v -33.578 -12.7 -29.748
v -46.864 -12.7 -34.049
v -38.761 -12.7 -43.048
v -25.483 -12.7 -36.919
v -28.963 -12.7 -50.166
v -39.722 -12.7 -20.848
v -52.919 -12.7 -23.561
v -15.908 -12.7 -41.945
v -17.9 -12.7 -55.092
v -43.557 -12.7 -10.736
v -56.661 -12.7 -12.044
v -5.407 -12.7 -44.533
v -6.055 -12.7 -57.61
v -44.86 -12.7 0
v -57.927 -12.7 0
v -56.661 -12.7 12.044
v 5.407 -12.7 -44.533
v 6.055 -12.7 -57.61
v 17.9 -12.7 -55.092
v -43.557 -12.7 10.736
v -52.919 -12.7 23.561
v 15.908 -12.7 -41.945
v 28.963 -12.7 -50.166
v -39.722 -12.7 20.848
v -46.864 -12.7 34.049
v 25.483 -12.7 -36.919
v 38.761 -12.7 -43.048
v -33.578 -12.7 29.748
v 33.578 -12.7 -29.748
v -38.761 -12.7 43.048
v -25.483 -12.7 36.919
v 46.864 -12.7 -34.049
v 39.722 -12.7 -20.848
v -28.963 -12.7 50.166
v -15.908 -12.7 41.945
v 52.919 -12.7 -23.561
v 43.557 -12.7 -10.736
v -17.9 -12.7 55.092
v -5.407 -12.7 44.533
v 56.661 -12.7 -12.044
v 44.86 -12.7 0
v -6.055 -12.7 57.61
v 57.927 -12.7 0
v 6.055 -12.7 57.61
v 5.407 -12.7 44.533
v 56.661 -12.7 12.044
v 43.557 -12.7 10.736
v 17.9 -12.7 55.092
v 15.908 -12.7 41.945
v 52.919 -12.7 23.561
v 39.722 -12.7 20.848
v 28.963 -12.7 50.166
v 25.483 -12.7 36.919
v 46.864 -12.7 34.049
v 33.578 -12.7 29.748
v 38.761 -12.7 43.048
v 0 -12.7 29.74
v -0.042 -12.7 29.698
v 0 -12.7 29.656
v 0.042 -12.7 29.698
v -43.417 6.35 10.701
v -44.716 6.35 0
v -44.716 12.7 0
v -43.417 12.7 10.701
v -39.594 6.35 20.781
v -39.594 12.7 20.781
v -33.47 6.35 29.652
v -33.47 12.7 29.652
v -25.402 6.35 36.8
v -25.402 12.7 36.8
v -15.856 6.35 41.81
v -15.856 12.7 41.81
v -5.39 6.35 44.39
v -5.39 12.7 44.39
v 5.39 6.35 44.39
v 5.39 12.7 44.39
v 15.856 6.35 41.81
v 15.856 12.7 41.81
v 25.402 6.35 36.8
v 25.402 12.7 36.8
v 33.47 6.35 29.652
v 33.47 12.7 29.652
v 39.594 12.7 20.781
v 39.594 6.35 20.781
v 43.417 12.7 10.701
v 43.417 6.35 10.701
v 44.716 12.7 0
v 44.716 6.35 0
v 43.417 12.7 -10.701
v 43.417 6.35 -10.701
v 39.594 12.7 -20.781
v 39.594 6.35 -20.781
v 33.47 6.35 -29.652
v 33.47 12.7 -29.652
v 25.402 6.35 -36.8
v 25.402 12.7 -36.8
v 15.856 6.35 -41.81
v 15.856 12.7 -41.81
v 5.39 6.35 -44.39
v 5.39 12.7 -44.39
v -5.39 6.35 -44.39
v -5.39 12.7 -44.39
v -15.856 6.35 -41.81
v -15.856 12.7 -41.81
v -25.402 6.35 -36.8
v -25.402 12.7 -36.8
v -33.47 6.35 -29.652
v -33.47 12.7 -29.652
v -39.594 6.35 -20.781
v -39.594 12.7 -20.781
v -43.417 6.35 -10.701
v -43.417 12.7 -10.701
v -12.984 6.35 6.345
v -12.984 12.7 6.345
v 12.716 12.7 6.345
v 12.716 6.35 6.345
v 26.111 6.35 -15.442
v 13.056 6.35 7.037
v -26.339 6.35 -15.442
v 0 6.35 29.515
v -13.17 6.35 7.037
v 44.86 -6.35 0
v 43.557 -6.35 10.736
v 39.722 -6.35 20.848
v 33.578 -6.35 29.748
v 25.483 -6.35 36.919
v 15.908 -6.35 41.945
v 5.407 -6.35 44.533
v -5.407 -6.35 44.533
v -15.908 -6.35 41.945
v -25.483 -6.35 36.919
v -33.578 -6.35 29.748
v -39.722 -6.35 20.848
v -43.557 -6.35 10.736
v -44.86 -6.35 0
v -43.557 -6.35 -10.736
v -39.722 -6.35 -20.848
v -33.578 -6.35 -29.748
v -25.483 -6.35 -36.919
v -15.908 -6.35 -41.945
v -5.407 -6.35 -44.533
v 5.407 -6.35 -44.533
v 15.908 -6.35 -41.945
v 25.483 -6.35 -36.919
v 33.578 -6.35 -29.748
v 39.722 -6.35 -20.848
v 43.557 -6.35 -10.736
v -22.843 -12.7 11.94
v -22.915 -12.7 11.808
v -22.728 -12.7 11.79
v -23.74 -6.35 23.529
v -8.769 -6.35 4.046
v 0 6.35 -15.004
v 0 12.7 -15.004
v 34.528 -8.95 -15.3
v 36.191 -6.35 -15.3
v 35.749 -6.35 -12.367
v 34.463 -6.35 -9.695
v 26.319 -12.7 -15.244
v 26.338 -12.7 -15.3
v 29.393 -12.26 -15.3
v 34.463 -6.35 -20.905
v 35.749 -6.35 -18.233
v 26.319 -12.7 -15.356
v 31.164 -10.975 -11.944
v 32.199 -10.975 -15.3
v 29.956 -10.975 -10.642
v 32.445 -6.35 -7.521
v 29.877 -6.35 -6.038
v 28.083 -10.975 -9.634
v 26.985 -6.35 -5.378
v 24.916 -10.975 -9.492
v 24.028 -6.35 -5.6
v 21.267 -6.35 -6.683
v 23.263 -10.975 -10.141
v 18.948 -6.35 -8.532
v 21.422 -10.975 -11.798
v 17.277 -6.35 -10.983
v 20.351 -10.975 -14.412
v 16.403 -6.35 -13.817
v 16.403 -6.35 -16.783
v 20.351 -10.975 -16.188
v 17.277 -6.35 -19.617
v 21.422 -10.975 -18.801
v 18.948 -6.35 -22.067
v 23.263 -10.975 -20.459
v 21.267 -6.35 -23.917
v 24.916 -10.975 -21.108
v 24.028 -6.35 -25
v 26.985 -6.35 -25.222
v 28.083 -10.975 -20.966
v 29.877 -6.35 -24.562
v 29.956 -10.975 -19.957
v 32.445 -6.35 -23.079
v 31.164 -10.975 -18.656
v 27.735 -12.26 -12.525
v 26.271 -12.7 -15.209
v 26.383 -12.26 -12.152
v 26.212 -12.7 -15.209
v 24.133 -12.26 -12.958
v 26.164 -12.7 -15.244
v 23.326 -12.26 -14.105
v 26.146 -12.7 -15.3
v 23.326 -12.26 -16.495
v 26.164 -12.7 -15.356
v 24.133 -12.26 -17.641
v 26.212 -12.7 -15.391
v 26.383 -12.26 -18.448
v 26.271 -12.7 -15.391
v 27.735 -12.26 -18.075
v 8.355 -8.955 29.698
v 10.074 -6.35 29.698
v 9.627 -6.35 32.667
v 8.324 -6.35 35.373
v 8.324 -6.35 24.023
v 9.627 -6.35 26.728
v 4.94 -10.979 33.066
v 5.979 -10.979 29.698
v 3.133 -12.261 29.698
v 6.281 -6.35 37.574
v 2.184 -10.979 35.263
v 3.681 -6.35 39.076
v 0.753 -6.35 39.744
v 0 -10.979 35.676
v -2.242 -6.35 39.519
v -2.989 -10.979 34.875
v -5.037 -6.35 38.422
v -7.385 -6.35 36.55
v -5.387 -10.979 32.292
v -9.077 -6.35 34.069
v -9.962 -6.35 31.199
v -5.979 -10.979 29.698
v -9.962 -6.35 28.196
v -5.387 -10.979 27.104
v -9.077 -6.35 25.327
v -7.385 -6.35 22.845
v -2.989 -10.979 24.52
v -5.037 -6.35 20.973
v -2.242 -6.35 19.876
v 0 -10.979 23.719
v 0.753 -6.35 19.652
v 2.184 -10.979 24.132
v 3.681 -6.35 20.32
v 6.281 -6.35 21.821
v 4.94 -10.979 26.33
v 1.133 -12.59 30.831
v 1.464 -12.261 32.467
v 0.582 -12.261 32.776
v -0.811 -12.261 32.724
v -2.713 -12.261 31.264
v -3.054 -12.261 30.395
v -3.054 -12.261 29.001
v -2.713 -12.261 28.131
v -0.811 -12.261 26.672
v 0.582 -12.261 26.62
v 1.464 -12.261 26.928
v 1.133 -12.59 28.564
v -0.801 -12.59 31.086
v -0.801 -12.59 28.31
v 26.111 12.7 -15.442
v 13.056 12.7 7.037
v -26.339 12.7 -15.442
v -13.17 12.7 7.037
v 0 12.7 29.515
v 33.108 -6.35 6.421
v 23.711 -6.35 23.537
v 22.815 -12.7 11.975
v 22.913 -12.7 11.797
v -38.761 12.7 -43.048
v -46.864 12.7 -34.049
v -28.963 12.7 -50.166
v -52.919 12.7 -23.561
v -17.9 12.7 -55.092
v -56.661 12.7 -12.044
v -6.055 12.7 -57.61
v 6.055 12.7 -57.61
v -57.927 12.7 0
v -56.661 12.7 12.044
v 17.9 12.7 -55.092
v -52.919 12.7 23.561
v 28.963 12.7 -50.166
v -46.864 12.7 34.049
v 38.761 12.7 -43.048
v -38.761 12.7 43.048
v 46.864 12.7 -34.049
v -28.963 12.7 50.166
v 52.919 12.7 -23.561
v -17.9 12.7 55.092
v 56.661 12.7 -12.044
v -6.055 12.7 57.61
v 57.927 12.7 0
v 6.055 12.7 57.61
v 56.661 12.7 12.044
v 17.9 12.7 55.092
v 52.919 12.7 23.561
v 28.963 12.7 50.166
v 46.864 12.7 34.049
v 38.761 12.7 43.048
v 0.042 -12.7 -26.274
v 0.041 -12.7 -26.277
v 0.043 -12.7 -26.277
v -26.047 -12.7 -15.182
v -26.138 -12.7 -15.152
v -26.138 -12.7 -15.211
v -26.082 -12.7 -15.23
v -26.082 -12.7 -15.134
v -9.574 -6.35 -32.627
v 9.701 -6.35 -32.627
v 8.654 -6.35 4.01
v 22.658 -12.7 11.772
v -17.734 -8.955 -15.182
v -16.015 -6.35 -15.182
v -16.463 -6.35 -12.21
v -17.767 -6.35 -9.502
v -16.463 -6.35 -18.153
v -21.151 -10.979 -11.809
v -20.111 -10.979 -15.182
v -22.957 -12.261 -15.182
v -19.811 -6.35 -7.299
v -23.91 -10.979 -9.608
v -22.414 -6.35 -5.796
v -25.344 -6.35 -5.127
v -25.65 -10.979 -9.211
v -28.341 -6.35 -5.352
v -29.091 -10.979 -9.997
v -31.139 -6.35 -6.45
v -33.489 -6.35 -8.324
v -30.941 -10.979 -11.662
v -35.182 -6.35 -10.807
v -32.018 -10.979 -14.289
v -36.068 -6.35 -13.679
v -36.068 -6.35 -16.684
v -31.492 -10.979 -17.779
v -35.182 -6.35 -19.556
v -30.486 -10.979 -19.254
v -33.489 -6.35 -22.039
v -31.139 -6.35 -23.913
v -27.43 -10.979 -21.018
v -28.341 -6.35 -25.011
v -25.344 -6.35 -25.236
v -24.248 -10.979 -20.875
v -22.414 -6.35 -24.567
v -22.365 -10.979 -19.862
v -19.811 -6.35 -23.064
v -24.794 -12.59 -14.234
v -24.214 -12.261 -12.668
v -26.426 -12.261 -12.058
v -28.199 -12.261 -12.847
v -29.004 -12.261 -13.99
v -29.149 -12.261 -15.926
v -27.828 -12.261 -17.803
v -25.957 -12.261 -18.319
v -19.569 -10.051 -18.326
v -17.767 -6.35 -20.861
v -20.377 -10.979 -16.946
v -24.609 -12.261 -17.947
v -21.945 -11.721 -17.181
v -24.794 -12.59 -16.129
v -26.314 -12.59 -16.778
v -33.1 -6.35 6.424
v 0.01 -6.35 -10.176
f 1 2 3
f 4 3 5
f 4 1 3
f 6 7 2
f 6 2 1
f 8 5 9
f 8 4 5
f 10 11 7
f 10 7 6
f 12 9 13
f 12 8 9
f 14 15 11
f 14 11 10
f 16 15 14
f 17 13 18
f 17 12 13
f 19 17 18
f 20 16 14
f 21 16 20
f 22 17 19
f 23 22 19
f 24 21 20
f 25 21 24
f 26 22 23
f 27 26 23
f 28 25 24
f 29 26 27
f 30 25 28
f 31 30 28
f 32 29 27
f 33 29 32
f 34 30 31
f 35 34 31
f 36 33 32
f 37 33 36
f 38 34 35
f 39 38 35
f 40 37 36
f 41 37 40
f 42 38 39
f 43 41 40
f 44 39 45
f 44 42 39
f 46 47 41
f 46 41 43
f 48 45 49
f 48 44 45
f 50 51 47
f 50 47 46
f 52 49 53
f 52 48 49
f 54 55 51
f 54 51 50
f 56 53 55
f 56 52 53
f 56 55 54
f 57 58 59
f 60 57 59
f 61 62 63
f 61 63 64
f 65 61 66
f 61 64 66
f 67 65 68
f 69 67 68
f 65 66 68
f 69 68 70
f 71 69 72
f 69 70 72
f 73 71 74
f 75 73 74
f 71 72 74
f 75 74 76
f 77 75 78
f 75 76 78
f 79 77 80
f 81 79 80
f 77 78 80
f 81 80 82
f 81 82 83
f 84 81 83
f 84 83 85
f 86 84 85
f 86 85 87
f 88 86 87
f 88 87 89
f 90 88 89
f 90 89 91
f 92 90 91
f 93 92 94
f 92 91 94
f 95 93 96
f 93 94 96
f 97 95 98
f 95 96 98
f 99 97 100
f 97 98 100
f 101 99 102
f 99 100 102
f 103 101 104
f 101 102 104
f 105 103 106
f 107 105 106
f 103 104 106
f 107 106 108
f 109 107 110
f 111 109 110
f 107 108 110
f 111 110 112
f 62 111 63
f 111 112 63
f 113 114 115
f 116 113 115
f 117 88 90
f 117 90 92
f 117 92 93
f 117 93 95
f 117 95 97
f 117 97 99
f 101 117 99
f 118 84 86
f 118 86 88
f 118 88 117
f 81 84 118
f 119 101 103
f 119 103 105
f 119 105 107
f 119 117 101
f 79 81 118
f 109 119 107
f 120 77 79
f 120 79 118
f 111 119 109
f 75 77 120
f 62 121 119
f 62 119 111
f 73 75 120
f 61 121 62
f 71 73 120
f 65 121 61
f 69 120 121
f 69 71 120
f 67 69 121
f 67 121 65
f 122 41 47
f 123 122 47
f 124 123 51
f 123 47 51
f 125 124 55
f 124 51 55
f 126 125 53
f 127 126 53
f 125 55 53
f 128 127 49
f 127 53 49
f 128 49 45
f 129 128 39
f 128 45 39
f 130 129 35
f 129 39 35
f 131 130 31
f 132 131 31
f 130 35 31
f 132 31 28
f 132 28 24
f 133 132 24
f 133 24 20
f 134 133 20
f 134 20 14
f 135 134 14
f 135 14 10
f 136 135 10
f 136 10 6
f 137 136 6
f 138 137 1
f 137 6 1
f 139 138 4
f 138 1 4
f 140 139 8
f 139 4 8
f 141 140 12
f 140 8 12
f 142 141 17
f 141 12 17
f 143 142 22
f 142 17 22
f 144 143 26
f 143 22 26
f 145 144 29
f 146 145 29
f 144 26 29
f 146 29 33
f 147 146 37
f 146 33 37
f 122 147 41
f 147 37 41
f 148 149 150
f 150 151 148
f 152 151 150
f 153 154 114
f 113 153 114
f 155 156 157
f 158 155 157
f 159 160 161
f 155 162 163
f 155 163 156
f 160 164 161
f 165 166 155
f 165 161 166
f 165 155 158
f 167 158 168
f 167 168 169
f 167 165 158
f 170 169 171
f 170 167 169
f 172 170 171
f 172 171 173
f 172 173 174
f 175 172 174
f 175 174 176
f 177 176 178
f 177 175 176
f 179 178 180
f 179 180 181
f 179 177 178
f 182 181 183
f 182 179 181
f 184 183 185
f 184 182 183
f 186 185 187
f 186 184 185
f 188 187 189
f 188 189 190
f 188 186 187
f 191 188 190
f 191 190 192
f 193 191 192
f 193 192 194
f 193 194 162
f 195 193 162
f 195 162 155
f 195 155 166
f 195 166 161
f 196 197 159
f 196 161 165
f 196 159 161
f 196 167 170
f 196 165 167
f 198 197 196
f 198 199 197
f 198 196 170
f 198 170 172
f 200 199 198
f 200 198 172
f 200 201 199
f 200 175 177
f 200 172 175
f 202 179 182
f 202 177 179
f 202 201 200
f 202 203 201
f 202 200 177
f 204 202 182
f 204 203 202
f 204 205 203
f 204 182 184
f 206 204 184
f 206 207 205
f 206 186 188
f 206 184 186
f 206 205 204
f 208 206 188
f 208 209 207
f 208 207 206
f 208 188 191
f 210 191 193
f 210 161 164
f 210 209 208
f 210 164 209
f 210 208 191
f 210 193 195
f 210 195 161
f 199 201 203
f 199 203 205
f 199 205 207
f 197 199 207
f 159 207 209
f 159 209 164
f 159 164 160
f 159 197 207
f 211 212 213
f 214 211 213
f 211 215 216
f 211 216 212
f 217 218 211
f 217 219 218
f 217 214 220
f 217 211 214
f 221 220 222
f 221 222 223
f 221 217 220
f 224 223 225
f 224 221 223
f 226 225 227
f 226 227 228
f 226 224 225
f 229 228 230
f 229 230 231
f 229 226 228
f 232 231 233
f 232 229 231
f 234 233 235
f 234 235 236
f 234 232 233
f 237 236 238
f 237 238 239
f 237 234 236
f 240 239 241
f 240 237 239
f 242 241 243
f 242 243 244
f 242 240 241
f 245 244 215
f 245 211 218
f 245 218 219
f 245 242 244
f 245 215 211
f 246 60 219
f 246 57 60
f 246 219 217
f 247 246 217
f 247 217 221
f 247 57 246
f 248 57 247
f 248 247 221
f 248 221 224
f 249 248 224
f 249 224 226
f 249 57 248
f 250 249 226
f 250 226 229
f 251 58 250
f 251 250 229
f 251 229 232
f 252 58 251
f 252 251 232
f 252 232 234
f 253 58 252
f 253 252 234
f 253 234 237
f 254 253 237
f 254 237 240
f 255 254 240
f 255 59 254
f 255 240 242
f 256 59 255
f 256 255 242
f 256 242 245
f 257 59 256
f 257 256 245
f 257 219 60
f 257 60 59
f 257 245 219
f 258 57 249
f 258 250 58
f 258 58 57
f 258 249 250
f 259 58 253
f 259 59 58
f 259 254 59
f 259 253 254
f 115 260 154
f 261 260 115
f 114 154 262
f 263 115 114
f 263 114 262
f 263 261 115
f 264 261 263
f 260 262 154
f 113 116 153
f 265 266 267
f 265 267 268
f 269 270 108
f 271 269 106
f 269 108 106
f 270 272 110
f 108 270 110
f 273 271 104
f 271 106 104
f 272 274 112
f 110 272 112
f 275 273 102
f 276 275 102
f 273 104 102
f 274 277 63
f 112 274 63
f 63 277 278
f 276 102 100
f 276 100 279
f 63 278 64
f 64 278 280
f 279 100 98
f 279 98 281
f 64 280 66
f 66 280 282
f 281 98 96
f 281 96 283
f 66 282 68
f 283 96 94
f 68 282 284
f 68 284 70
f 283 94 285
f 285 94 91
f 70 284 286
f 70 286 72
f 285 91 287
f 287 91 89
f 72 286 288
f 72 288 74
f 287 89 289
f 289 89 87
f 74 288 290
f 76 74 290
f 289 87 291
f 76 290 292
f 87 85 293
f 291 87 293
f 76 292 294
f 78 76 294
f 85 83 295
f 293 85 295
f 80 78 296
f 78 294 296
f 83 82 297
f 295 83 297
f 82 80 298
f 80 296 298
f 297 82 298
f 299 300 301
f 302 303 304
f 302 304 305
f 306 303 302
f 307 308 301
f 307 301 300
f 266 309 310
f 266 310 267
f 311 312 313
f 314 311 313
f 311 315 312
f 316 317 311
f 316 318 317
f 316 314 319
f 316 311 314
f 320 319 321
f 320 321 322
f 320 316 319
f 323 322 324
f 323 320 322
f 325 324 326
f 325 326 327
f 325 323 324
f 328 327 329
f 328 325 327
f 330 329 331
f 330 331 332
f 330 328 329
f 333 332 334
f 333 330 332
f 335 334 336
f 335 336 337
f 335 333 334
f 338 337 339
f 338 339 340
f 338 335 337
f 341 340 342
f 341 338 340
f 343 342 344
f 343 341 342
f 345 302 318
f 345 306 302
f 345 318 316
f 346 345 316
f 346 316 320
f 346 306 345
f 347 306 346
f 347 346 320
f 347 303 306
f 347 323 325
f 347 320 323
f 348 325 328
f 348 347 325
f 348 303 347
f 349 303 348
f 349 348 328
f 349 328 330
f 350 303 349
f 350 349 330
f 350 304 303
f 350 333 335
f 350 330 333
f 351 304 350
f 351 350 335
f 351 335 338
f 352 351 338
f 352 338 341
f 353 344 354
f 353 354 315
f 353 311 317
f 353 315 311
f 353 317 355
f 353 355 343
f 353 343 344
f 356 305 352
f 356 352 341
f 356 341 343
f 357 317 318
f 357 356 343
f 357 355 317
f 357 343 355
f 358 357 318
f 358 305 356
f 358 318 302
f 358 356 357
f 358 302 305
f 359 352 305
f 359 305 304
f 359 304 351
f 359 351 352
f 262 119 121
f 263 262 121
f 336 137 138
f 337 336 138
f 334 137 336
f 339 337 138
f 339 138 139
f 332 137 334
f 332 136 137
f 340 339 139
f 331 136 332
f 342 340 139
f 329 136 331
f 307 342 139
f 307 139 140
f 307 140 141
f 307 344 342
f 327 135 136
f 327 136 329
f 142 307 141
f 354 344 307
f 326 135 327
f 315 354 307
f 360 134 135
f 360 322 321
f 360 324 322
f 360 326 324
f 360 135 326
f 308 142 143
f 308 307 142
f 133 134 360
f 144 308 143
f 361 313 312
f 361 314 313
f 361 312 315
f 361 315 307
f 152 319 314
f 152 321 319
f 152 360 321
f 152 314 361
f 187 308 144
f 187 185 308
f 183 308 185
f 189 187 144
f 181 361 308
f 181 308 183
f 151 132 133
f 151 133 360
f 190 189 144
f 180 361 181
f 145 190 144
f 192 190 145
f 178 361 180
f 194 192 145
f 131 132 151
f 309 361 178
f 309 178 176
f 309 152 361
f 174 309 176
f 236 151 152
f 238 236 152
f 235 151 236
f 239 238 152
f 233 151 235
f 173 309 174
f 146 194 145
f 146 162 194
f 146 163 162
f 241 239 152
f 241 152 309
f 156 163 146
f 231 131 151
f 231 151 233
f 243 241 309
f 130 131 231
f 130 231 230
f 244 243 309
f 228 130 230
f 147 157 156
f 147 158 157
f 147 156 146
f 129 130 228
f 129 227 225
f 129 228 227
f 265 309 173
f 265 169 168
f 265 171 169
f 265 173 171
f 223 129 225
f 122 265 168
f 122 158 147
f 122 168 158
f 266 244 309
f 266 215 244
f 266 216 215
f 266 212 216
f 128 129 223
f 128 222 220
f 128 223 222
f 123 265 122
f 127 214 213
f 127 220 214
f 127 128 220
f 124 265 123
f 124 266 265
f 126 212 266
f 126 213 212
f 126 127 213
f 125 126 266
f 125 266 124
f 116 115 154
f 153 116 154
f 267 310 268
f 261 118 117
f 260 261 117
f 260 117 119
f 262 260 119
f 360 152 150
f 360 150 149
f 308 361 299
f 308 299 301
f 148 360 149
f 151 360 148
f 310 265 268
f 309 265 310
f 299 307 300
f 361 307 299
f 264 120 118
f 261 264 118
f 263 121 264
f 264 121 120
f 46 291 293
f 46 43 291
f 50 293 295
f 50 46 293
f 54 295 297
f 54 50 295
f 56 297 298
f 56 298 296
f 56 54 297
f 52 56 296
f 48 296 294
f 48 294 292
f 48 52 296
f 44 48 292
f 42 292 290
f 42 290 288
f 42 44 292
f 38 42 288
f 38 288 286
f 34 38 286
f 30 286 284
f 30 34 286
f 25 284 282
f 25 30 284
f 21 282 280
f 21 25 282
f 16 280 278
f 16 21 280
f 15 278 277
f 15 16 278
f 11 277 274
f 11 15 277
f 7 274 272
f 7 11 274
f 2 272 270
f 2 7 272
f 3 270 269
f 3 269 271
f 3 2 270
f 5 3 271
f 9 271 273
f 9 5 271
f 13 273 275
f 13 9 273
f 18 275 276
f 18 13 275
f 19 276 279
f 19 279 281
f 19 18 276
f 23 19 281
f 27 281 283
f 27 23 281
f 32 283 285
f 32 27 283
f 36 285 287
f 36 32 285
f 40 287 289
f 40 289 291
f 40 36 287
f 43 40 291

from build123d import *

# Parameters (mm, degrees)
F0_R          = 57.9269385224
F0_R_2        = 45.238930614
F0_R_3        = 10.232456426
F0_R_4        = 9.9260337363
F0_R_5        = 10.3400506536
F1_DEPTH      = 12.7
F2_DEPTH      = 12.7
F3_R          = 44.8601198224
F4_DEPTH      = 6.35
F5_R          = 44.7159015694
F6_DEPTH      = 6.35
F7_R          = 10.0743297083
F7_R_2        = 9.9496681994
F7_R_3        = 10.0826621072
F8_DEPTH      = 6.35
F13_DEPTH     = 6.35
F14_T4_DEPTH  = 74.4109063998
F14_T11_DEPTH = 74.5717160691
F14_T18_DEPTH = 67.9697661213
F14_T26_DEPTH = 74.4109063998
F14_T31_DEPTH = 67.9697661213
F14_T39_DEPTH = 74.4109063998
F14_T44_DEPTH = 74.5717160691
F14_T52_DEPTH = 74.5717160691
F14_T57_DEPTH = 67.9697661213
F15_T4_DEPTH  = 74.5533850225
F15_T11_DEPTH = 67.988668277
F15_T18_DEPTH = 74.6646190403
F15_T26_DEPTH = 74.5533850225
F15_T31_DEPTH = 74.6646190403
F15_T39_DEPTH = 74.5533850225
F15_T44_DEPTH = 67.988668277
F15_T52_DEPTH = 74.6646190403
F15_T57_DEPTH = 67.988668277
F16_T4_DEPTH  = 74.2472188603
F16_T10_DEPTH = 74.1921905859
F16_T16_DEPTH = 67.5143742402
F18_DEPTH     = 6.35
F20_DEPTH     = 6.35


# Not quite as in the source:
# - a fillet or chamfer that OpenCascade refuses, or shapes differently, is made with other operations: its cross-section is extruded or revolved along the edge and cut away or added


with BuildPart() as f1:
    # F0 (on Front) → F1 (new body)
    with BuildSketch(Plane.XZ):
        Circle(F0_R)
        Circle(F0_R_2, mode=Mode.SUBTRACT)
        Circle(F0_R_2)
        with Locations((-26.1295642704, -15.3669575229)):
            Circle(F0_R_3, mode=Mode.SUBTRACT)
        Polygon((-12.544834055, -34.5090515912), (0, -5.3877583705), (12.6424450427, -34.5090515912), align=None, mode=Mode.SUBTRACT)
        with Locations((26.1333119124, -15.1850637048)):
            Circle(F0_R_4, mode=Mode.SUBTRACT)
        Polygon((-36.0336452723, 4.8764180392), (-24.01153557, 26.9035063684), (-4.5260344632, 1.7700339667), align=None, mode=Mode.SUBTRACT)
        Polygon((36.1581519246, 4.842239432), (4.4649434276, 1.758374623), (24.0084677935, 26.875147596), align=None, mode=Mode.SUBTRACT)
        with Locations((0, 29.5979101211)):
            Circle(F0_R_5, mode=Mode.SUBTRACT)
        with Locations((0, 29.5979101211)):
            Circle(F0_R_5)
        Polygon((-4.5260344632, 1.7700339667), (-24.01153557, 26.9035063684), (-36.0336452723, 4.8764180392), align=None)
        with Locations((-26.1295642704, -15.3669575229)):
            Circle(F0_R_3)
        Polygon((12.6424450427, -34.5090515912), (0, -5.3877583705), (-12.544834055, -34.5090515912), align=None)
        with Locations((26.1333119124, -15.1850637048)):
            Circle(F0_R_4)
        Polygon((24.0084677935, 26.875147596), (4.4649434276, 1.758374623), (36.1581519246, 4.842239432), align=None)
    extrude(amount=F1_DEPTH)

    # F2 (add): a face of the model
    f2_faces = [f1.faces().sort_by_distance(p)[0] for p in [
        (0, 0, 0),
    ]]
    extrude(f2_faces, amount=F2_DEPTH)

    # F3 (on face) → F4 (cut)
    with BuildSketch(Plane.XZ.offset(12.7)):
        Circle(F3_R)
    extrude(amount=-F4_DEPTH, mode=Mode.SUBTRACT)

    # F5 (on face) → F6 (cut)
    with BuildSketch(Plane(origin=(0, 12.7, 0), x_dir=(-1, 0, 0), z_dir=(0, 1, 0))):
        Circle(F5_R)
    extrude(amount=-F6_DEPTH, mode=Mode.SUBTRACT)

    # F7 (on face) → F8 (join)
    with BuildSketch(Plane.XZ.offset(6.35)):
        with Locations((0, 29.6977050602)):
            Circle(F7_R)
        with Locations((26.2417513877, -15.2999386191)):
            Circle(F7_R_2)
        with Locations((-26.0976161808, -15.1815246791)):
            Circle(F7_R_3)
    extrude(amount=F8_DEPTH)

    # F9: fillet of radius 11.0998 on 1 edges, made by hand

    # F9_s1 → F9_t2 (revolve, cut)
    with BuildSketch(Plane.XY.offset(29.6977050602)):
        with BuildLine():
            ThreePointArc((10.0743297083, -6.35), (5.9786194513, -10.9790962592), (0.0421335379, -12.7))
            Line((0.0421335379, -12.7), (10.0743297083, -12.7))
            Line((10.0743297083, -12.7), (10.0743297083, -6.35))
        make_face()
    revolve(axis=Axis((0, -12.7, 29.6977050602), (0, -1, 0)), mode=Mode.SUBTRACT)

    # F10: fillet of radius 11.0998 on 1 edges, made by hand

    # F10_s1 → F10_t2 (revolve, cut)
    with BuildSketch(Plane.XY.offset(-15.1815246791)):
        with BuildLine():
            ThreePointArc((-16.0149540736, -6.35), (-20.1106643305, -10.9790962592), (-26.0471502439, -12.7))
            Line((-26.0471502439, -12.7), (-16.0149540736, -12.7))
            Line((-16.0149540736, -12.7), (-16.0149540736, -6.35))
        make_face()
    revolve(axis=Axis((-26.0976161808, -12.7, -15.1815246791), (0, -1, 0)), mode=Mode.SUBTRACT)

    # F11: fillet of radius 10.8204 on 1 edges, made by hand

    # F11_s1 → F11_t2 (revolve, cut)
    with BuildSketch(Plane.XY.offset(-15.2999386191)):
        with BuildLine():
            ThreePointArc((36.1914195871, -6.35), (32.1989541242, -10.9749991754), (26.3376598985, -12.7))
            Line((26.3376598985, -12.7), (36.1914195871, -12.7))
            Line((36.1914195871, -12.7), (36.1914195871, -6.35))
        make_face()
    revolve(axis=Axis((26.2417513877, -12.7, -15.2999386191), (0, -1, 0)), mode=Mode.SUBTRACT)

    # F12 (on face) → F13 (join)
    with BuildSketch(Plane.XZ.offset(6.35)):
        Polygon((-4.5254253782, 1.6911323182), (-24.0121241659, 27.0516239107), (-36.1962728202, 4.7867787071), align=None)
        Polygon((36.2073592842, 4.7867787071), (23.9838846028, 27.0516239107), (4.3973103166, 1.6507724067), align=None)
        Polygon((12.5976987183, -34.5319546759), (0, -5.3459731862), (-12.4581893906, -34.5319546759), align=None)
    extrude(amount=F13_DEPTH)

    # F14: chamfer of 8.2804 on 3 edges, made by hand


with BuildPart() as f14_tool2:
    # F14_s3 → F14_t4 (new body)
    with BuildSketch(Plane(origin=(-57.5107438509, 0, 5.6213502606), x_dir=(0, 1, 0), z_dir=(0.9952569801, 0, -0.0972807463))):
        with BuildLine():
            Line((-4.1853949204, 1.008669406), (-12.9342050796, 9.7574795653))
            Line((-12.9342050796, 9.7574795653), (-13.0998130796, 9.7574795653))
            ThreePointArc((-13.0998130796, 9.7574795653), (-12.865608, 5.5001770255), (-12.865608, 1.2428744857))
            Line((-12.865608, 1.2428744857), (-12.7, 1.0772664857))
            ThreePointArc((-12.7, 1.0772664857), (-8.4426974602, 1.0772664857), (-4.1853949204, 0.843061406))
            Line((-4.1853949204, 0.843061406), (-4.1853949204, 1.008669406))
        make_face()
    extrude(amount=F14_T4_DEPTH)

    split(bisect_by=Plane.XZ.offset(6.35), keep=Keep.TOP)

    split(bisect_by=Plane(origin=(-29.8705033929, 0, 16.3462467576), x_dir=(0, 1, 0), z_dir=(0.8772373953, 0, -0.4800568219)), keep=Keep.TOP)

    split(bisect_by=Plane(origin=(-2.0283818724, 0, -1.5585844001), x_dir=(0, 1, 0), z_dir=(-0.7929468135, 0, -0.6092908591)), keep=Keep.TOP)


with BuildPart() as f1_1:
    add(f1.part)

    # F14_t1: cut F14_tool2
    add(f14_tool2.part, mode=Mode.SUBTRACT)


with BuildPart() as f14_tool9:
    # F14_s10 → F14_t11 (new body)
    with BuildSketch(Plane(origin=(10.477539574, 0, -13.6357398024), x_dir=(0, 1, 0), z_dir=(-0.6092908591, 0, 0.7929468135))):
        with BuildLine():
            Line((-4.1853949204, 2.3238250907), (-12.9342050796, 11.07263525))
            Line((-12.9342050796, 11.07263525), (-13.0998130796, 11.07263525))
            ThreePointArc((-13.0998130796, 11.07263525), (-12.865608, 6.8153327102), (-12.865608, 2.5580301704))
            Line((-12.865608, 2.5580301704), (-12.7, 2.3924221704))
            ThreePointArc((-12.7, 2.3924221704), (-8.4426974602, 2.3924221704), (-4.1853949204, 2.1582170907))
            Line((-4.1853949204, 2.1582170907), (-4.1853949204, 2.3238250907))
        make_face()
    extrude(amount=F14_T11_DEPTH)

    split(bisect_by=Plane.XZ.offset(6.35), keep=Keep.TOP)

    split(bisect_by=Plane(origin=(0.1209077576, 0, 1.2369795072), x_dir=(0, 1, 0), z_dir=(0.0972807463, 0, 0.9952569801)), keep=Keep.TOP)

    split(bisect_by=Plane(origin=(-29.8705033929, 0, 16.3462467576), x_dir=(0, 1, 0), z_dir=(0.8772373953, 0, -0.4800568219)), keep=Keep.TOP)


with BuildPart() as f1_2:
    add(f1_1.part)

    # F14_t8: cut F14_tool9
    add(f14_tool9.part, mode=Mode.SUBTRACT)


with BuildPart() as f14_tool16:
    # F14_s17 → F14_t18 (new body)
    with BuildSketch(Plane(origin=(16.080979856, 0, 29.3857648468), x_dir=(0, 1, 0), z_dir=(-0.4800568219, 0, -0.8772373953))):
        with BuildLine():
            Line((-4.1853949204, -34.2848549414), (-12.9342050796, -25.5360447821))
            Line((-12.9342050796, -25.5360447821), (-13.0998130796, -25.5360447821))
            ThreePointArc((-13.0998130796, -25.5360447821), (-12.865608, -29.7933473219), (-12.865608, -34.0506498617))
            Line((-12.865608, -34.0506498617), (-12.7, -34.2162578617))
            ThreePointArc((-12.7, -34.2162578617), (-8.4426974602, -34.2162578617), (-4.1853949204, -34.4504629414))
            Line((-4.1853949204, -34.4504629414), (-4.1853949204, -34.2848549414))
        make_face()
    extrude(amount=F14_T18_DEPTH)

    split(bisect_by=Plane.XZ.offset(6.35), keep=Keep.TOP)

    split(bisect_by=Plane(origin=(0.1209077576, 0, 1.2369795072), x_dir=(0, 1, 0), z_dir=(0.0972807463, 0, 0.9952569801)), keep=Keep.TOP)

    split(bisect_by=Plane(origin=(-2.0283818724, 0, -1.5585844001), x_dir=(0, 1, 0), z_dir=(-0.7929468135, 0, -0.6092908591)), keep=Keep.TOP)


with BuildPart() as f1_3:
    add(f1_2.part)

    # F14_t15: cut F14_tool16
    add(f14_tool16.part, mode=Mode.SUBTRACT)


with BuildPart() as f14_tool24:
    # F14_s25 → F14_t26 (new body)
    with BuildSketch(Plane(origin=(-57.5107438509, 0, 5.6213502606), x_dir=(0, 1, 0), z_dir=(0.9952569801, 0, -0.0972807463))):
        with BuildLine():
            Line((-4.1853949204, 1.008669406), (-12.9342050796, 9.7574795653))
            Line((-12.9342050796, 9.7574795653), (-13.0998130796, 9.7574795653))
            ThreePointArc((-13.0998130796, 9.7574795653), (-12.865608, 5.5001770255), (-12.865608, 1.2428744857))
            Line((-12.865608, 1.2428744857), (-12.7, 1.0772664857))
            ThreePointArc((-12.7, 1.0772664857), (-8.4426974602, 1.0772664857), (-4.1853949204, 0.843061406))
            Line((-4.1853949204, 0.843061406), (-4.1853949204, 1.008669406))
        make_face()
    extrude(amount=F14_T26_DEPTH)

    split(bisect_by=Plane.XZ.offset(6.35), keep=Keep.TOP)

    split(bisect_by=Plane(origin=(-29.8705033929, 0, 16.3462467576), x_dir=(0, 1, 0), z_dir=(-0.8772373953, 0, 0.4800568219)), keep=Keep.TOP)


with BuildPart() as f14_tool29:
    # F14_s30 → F14_t31 (new body)
    with BuildSketch(Plane(origin=(16.080979856, 0, 29.3857648468), x_dir=(0, 1, 0), z_dir=(-0.4800568219, 0, -0.8772373953))):
        with BuildLine():
            Line((-4.1853949204, -34.2848549414), (-12.9342050796, -25.5360447821))
            Line((-12.9342050796, -25.5360447821), (-13.0998130796, -25.5360447821))
            ThreePointArc((-13.0998130796, -25.5360447821), (-12.865608, -29.7933473219), (-12.865608, -34.0506498617))
            Line((-12.865608, -34.0506498617), (-12.7, -34.2162578617))
            ThreePointArc((-12.7, -34.2162578617), (-8.4426974602, -34.2162578617), (-4.1853949204, -34.4504629414))
            Line((-4.1853949204, -34.4504629414), (-4.1853949204, -34.2848549414))
        make_face()
    extrude(amount=F14_T31_DEPTH)

    split(bisect_by=Plane.XZ.offset(6.35), keep=Keep.TOP)

    split(bisect_by=Plane(origin=(0.1209077576, 0, 1.2369795072), x_dir=(0, 1, 0), z_dir=(-0.0972807463, 0, -0.9952569801)), keep=Keep.TOP)


with BuildPart() as f14_tool24_1:
    add(f14_tool24.part)

    # F14_t34: intersect F14_tool29
    add(f14_tool29.part, mode=Mode.INTERSECT)


with BuildPart() as f1_4:
    add(f1_3.part)

    # F14_t22: cut F14_tool24
    add(f14_tool24_1.part, mode=Mode.SUBTRACT)


with BuildPart() as f14_tool37:
    # F14_s38 → F14_t39 (new body)
    with BuildSketch(Plane(origin=(-57.5107438509, 0, 5.6213502606), x_dir=(0, 1, 0), z_dir=(0.9952569801, 0, -0.0972807463))):
        with BuildLine():
            Line((-4.1853949204, 1.008669406), (-12.9342050796, 9.7574795653))
            Line((-12.9342050796, 9.7574795653), (-13.0998130796, 9.7574795653))
            ThreePointArc((-13.0998130796, 9.7574795653), (-12.865608, 5.5001770255), (-12.865608, 1.2428744857))
            Line((-12.865608, 1.2428744857), (-12.7, 1.0772664857))
            ThreePointArc((-12.7, 1.0772664857), (-8.4426974602, 1.0772664857), (-4.1853949204, 0.843061406))
            Line((-4.1853949204, 0.843061406), (-4.1853949204, 1.008669406))
        make_face()
    extrude(amount=F14_T39_DEPTH)

    split(bisect_by=Plane.XZ.offset(6.35), keep=Keep.TOP)

    split(bisect_by=Plane(origin=(-2.0283818724, 0, -1.5585844001), x_dir=(0, 1, 0), z_dir=(0.7929468135, 0, 0.6092908591)), keep=Keep.TOP)


with BuildPart() as f14_tool42:
    # F14_s43 → F14_t44 (new body)
    with BuildSketch(Plane(origin=(10.477539574, 0, -13.6357398024), x_dir=(0, 1, 0), z_dir=(-0.6092908591, 0, 0.7929468135))):
        with BuildLine():
            Line((-4.1853949204, 2.3238250907), (-12.9342050796, 11.07263525))
            Line((-12.9342050796, 11.07263525), (-13.0998130796, 11.07263525))
            ThreePointArc((-13.0998130796, 11.07263525), (-12.865608, 6.8153327102), (-12.865608, 2.5580301704))
            Line((-12.865608, 2.5580301704), (-12.7, 2.3924221704))
            ThreePointArc((-12.7, 2.3924221704), (-8.4426974602, 2.3924221704), (-4.1853949204, 2.1582170907))
            Line((-4.1853949204, 2.1582170907), (-4.1853949204, 2.3238250907))
        make_face()
    extrude(amount=F14_T44_DEPTH)

    split(bisect_by=Plane.XZ.offset(6.35), keep=Keep.TOP)

    split(bisect_by=Plane(origin=(0.1209077576, 0, 1.2369795072), x_dir=(0, 1, 0), z_dir=(-0.0972807463, 0, -0.9952569801)), keep=Keep.TOP)


with BuildPart() as f14_tool37_1:
    add(f14_tool37.part)

    # F14_t47: intersect F14_tool42
    add(f14_tool42.part, mode=Mode.INTERSECT)


with BuildPart() as f1_5:
    add(f1_4.part)

    # F14_t35: cut F14_tool37
    add(f14_tool37_1.part, mode=Mode.SUBTRACT)


with BuildPart() as f14_tool50:
    # F14_s51 → F14_t52 (new body)
    with BuildSketch(Plane(origin=(10.477539574, 0, -13.6357398024), x_dir=(0, 1, 0), z_dir=(-0.6092908591, 0, 0.7929468135))):
        with BuildLine():
            Line((-4.1853949204, 2.3238250907), (-12.9342050796, 11.07263525))
            Line((-12.9342050796, 11.07263525), (-13.0998130796, 11.07263525))
            ThreePointArc((-13.0998130796, 11.07263525), (-12.865608, 6.8153327102), (-12.865608, 2.5580301704))
            Line((-12.865608, 2.5580301704), (-12.7, 2.3924221704))
            ThreePointArc((-12.7, 2.3924221704), (-8.4426974602, 2.3924221704), (-4.1853949204, 2.1582170907))
            Line((-4.1853949204, 2.1582170907), (-4.1853949204, 2.3238250907))
        make_face()
    extrude(amount=F14_T52_DEPTH)

    split(bisect_by=Plane.XZ.offset(6.35), keep=Keep.TOP)

    split(bisect_by=Plane(origin=(-29.8705033929, 0, 16.3462467576), x_dir=(0, 1, 0), z_dir=(-0.8772373953, 0, 0.4800568219)), keep=Keep.TOP)


with BuildPart() as f14_tool55:
    # F14_s56 → F14_t57 (new body)
    with BuildSketch(Plane(origin=(16.080979856, 0, 29.3857648468), x_dir=(0, 1, 0), z_dir=(-0.4800568219, 0, -0.8772373953))):
        with BuildLine():
            Line((-4.1853949204, -34.2848549414), (-12.9342050796, -25.5360447821))
            Line((-12.9342050796, -25.5360447821), (-13.0998130796, -25.5360447821))
            ThreePointArc((-13.0998130796, -25.5360447821), (-12.865608, -29.7933473219), (-12.865608, -34.0506498617))
            Line((-12.865608, -34.0506498617), (-12.7, -34.2162578617))
            ThreePointArc((-12.7, -34.2162578617), (-8.4426974602, -34.2162578617), (-4.1853949204, -34.4504629414))
            Line((-4.1853949204, -34.4504629414), (-4.1853949204, -34.2848549414))
        make_face()
    extrude(amount=F14_T57_DEPTH)

    split(bisect_by=Plane.XZ.offset(6.35), keep=Keep.TOP)

    split(bisect_by=Plane(origin=(-2.0283818724, 0, -1.5585844001), x_dir=(0, 1, 0), z_dir=(0.7929468135, 0, 0.6092908591)), keep=Keep.TOP)


with BuildPart() as f14_tool50_1:
    add(f14_tool50.part)

    # F14_t60: intersect F14_tool55
    add(f14_tool55.part, mode=Mode.INTERSECT)


with BuildPart() as f1_6:
    add(f1_5.part)

    # F14_t48: cut F14_tool50
    add(f14_tool50_1.part, mode=Mode.SUBTRACT)

    # F15: chamfer of 8.2804 on 3 edges, made by hand


with BuildPart() as f15_tool2:
    # F15_s3 → F15_t4 (new body)
    with BuildSketch(Plane(origin=(-16.6756708248, 0, -1.6439776255), x_dir=(0, 1, 0), z_dir=(0.995175598, 0, 0.0981097812))):
        with BuildLine():
            Line((-4.1853949204, 0.9771841842), (-12.9342050796, 9.7259943435))
            Line((-12.9342050796, 9.7259943435), (-13.0998130796, 9.7259943435))
            ThreePointArc((-13.0998130796, 9.7259943435), (-12.865608, 5.4686918036), (-12.865608, 1.2113892638))
            Line((-12.865608, 1.2113892638), (-12.7, 1.0457812638))
            ThreePointArc((-12.7, 1.0457812638), (-8.4426974602, 1.0457812638), (-4.1853949204, 0.8115761842))
            Line((-4.1853949204, 0.8115761842), (-4.1853949204, 0.9771841842))
        make_face()
    extrude(amount=F15_T4_DEPTH)

    split(bisect_by=Plane.XZ.offset(6.35), keep=Keep.TOP)

    split(bisect_by=Plane(origin=(1.9593711293, 0, -1.510869357), x_dir=(0, 1, 0), z_dir=(0.7919084131, 0, -0.6106398818)), keep=Keep.TOP)

    split(bisect_by=Plane(origin=(29.8410766305, 0, 16.3828511415), x_dir=(0, 1, 0), z_dir=(-0.8765845615, 0, -0.4812478639)), keep=Keep.TOP)


with BuildPart() as f1_7:
    add(f1_6.part)

    # F15_t1: cut F15_tool2
    add(f15_tool2.part, mode=Mode.SUBTRACT)


with BuildPart() as f15_tool9:
    # F15_s10 → F15_t11 (new body)
    with BuildSketch(Plane(origin=(16.6142460012, 0, -30.2625583178), x_dir=(0, 1, 0), z_dir=(-0.4812478639, 0, 0.8765845615))):
        with BuildLine():
            Line((-4.1853949204, -34.2766442695), (-12.9342050796, -25.5278341102))
            Line((-12.9342050796, -25.5278341102), (-13.0998130796, -25.5278341102))
            ThreePointArc((-13.0998130796, -25.5278341102), (-12.865608, -29.78513665), (-12.865608, -34.0424391898))
            Line((-12.865608, -34.0424391898), (-12.7, -34.2080471898))
            ThreePointArc((-12.7, -34.2080471898), (-8.4426974602, -34.2080471898), (-4.1853949204, -34.4422522695))
            Line((-4.1853949204, -34.4422522695), (-4.1853949204, -34.2766442695))
        make_face()
    extrude(amount=F15_T11_DEPTH)

    split(bisect_by=Plane.XZ.offset(6.35), keep=Keep.TOP)

    split(bisect_by=Plane(origin=(-0.1188491357, 0, 1.205545035), x_dir=(0, 1, 0), z_dir=(-0.0981097812, 0, 0.995175598)), keep=Keep.TOP)

    split(bisect_by=Plane(origin=(1.9593711293, 0, -1.510869357), x_dir=(0, 1, 0), z_dir=(0.7919084131, 0, -0.6106398818)), keep=Keep.TOP)


with BuildPart() as f1_8:
    add(f1_7.part)

    # F15_t8: cut F15_tool9
    add(f15_tool9.part, mode=Mode.SUBTRACT)


with BuildPart() as f15_tool16:
    # F15_s17 → F15_t18 (new body)
    with BuildSketch(Plane(origin=(35.0278234042, 0, 45.4258375046), x_dir=(0, 1, 0), z_dir=(-0.6106398818, 0, -0.7919084131))):
        with BuildLine():
            Line((-4.1853949204, 2.2400344876), (-12.9342050796, 10.9888446469))
            Line((-12.9342050796, 10.9888446469), (-13.0998130796, 10.9888446469))
            ThreePointArc((-13.0998130796, 10.9888446469), (-12.865608, 6.7315421071), (-12.865608, 2.4742395673))
            Line((-12.865608, 2.4742395673), (-12.7, 2.3086315673))
            ThreePointArc((-12.7, 2.3086315673), (-8.4426974602, 2.3086315673), (-4.1853949204, 2.0744264876))
            Line((-4.1853949204, 2.0744264876), (-4.1853949204, 2.2400344876))
        make_face()
    extrude(amount=F15_T18_DEPTH)

    split(bisect_by=Plane.XZ.offset(6.35), keep=Keep.TOP)

    split(bisect_by=Plane(origin=(-0.1188491357, 0, 1.205545035), x_dir=(0, 1, 0), z_dir=(-0.0981097812, 0, 0.995175598)), keep=Keep.TOP)

    split(bisect_by=Plane(origin=(29.8410766305, 0, 16.3828511415), x_dir=(0, 1, 0), z_dir=(-0.8765845615, 0, -0.4812478639)), keep=Keep.TOP)


with BuildPart() as f1_9:
    add(f1_8.part)

    # F15_t15: cut F15_tool16
    add(f15_tool16.part, mode=Mode.SUBTRACT)


with BuildPart() as f15_tool24:
    # F15_s25 → F15_t26 (new body)
    with BuildSketch(Plane(origin=(-16.6756708248, 0, -1.6439776255), x_dir=(0, 1, 0), z_dir=(0.995175598, 0, 0.0981097812))):
        with BuildLine():
            Line((-4.1853949204, 0.9771841842), (-12.9342050796, 9.7259943435))
            Line((-12.9342050796, 9.7259943435), (-13.0998130796, 9.7259943435))
            ThreePointArc((-13.0998130796, 9.7259943435), (-12.865608, 5.4686918036), (-12.865608, 1.2113892638))
            Line((-12.865608, 1.2113892638), (-12.7, 1.0457812638))
            ThreePointArc((-12.7, 1.0457812638), (-8.4426974602, 1.0457812638), (-4.1853949204, 0.8115761842))
            Line((-4.1853949204, 0.8115761842), (-4.1853949204, 0.9771841842))
        make_face()
    extrude(amount=F15_T26_DEPTH)

    split(bisect_by=Plane.XZ.offset(6.35), keep=Keep.TOP)

    split(bisect_by=Plane(origin=(1.9593711293, 0, -1.510869357), x_dir=(0, 1, 0), z_dir=(-0.7919084131, 0, 0.6106398818)), keep=Keep.TOP)


with BuildPart() as f15_tool29:
    # F15_s30 → F15_t31 (new body)
    with BuildSketch(Plane(origin=(35.0278234042, 0, 45.4258375046), x_dir=(0, 1, 0), z_dir=(-0.6106398818, 0, -0.7919084131))):
        with BuildLine():
            Line((-4.1853949204, 2.2400344876), (-12.9342050796, 10.9888446469))
            Line((-12.9342050796, 10.9888446469), (-13.0998130796, 10.9888446469))
            ThreePointArc((-13.0998130796, 10.9888446469), (-12.865608, 6.7315421071), (-12.865608, 2.4742395673))
            Line((-12.865608, 2.4742395673), (-12.7, 2.3086315673))
            ThreePointArc((-12.7, 2.3086315673), (-8.4426974602, 2.3086315673), (-4.1853949204, 2.0744264876))
            Line((-4.1853949204, 2.0744264876), (-4.1853949204, 2.2400344876))
        make_face()
    extrude(amount=F15_T31_DEPTH)

    split(bisect_by=Plane.XZ.offset(6.35), keep=Keep.TOP)

    split(bisect_by=Plane(origin=(-0.1188491357, 0, 1.205545035), x_dir=(0, 1, 0), z_dir=(0.0981097812, 0, -0.995175598)), keep=Keep.TOP)


with BuildPart() as f15_tool24_1:
    add(f15_tool24.part)

    # F15_t34: intersect F15_tool29
    add(f15_tool29.part, mode=Mode.INTERSECT)


with BuildPart() as f1_10:
    add(f1_9.part)

    # F15_t22: cut F15_tool24
    add(f15_tool24_1.part, mode=Mode.SUBTRACT)


with BuildPart() as f15_tool37:
    # F15_s38 → F15_t39 (new body)
    with BuildSketch(Plane(origin=(-16.6756708248, 0, -1.6439776255), x_dir=(0, 1, 0), z_dir=(0.995175598, 0, 0.0981097812))):
        with BuildLine():
            Line((-4.1853949204, 0.9771841842), (-12.9342050796, 9.7259943435))
            Line((-12.9342050796, 9.7259943435), (-13.0998130796, 9.7259943435))
            ThreePointArc((-13.0998130796, 9.7259943435), (-12.865608, 5.4686918036), (-12.865608, 1.2113892638))
            Line((-12.865608, 1.2113892638), (-12.7, 1.0457812638))
            ThreePointArc((-12.7, 1.0457812638), (-8.4426974602, 1.0457812638), (-4.1853949204, 0.8115761842))
            Line((-4.1853949204, 0.8115761842), (-4.1853949204, 0.9771841842))
        make_face()
    extrude(amount=F15_T39_DEPTH)

    split(bisect_by=Plane.XZ.offset(6.35), keep=Keep.TOP)

    split(bisect_by=Plane(origin=(29.8410766305, 0, 16.3828511415), x_dir=(0, 1, 0), z_dir=(0.8765845615, 0, 0.4812478639)), keep=Keep.TOP)


with BuildPart() as f15_tool42:
    # F15_s43 → F15_t44 (new body)
    with BuildSketch(Plane(origin=(16.6142460012, 0, -30.2625583178), x_dir=(0, 1, 0), z_dir=(-0.4812478639, 0, 0.8765845615))):
        with BuildLine():
            Line((-4.1853949204, -34.2766442695), (-12.9342050796, -25.5278341102))
            Line((-12.9342050796, -25.5278341102), (-13.0998130796, -25.5278341102))
            ThreePointArc((-13.0998130796, -25.5278341102), (-12.865608, -29.78513665), (-12.865608, -34.0424391898))
            Line((-12.865608, -34.0424391898), (-12.7, -34.2080471898))
            ThreePointArc((-12.7, -34.2080471898), (-8.4426974602, -34.2080471898), (-4.1853949204, -34.4422522695))
            Line((-4.1853949204, -34.4422522695), (-4.1853949204, -34.2766442695))
        make_face()
    extrude(amount=F15_T44_DEPTH)

    split(bisect_by=Plane.XZ.offset(6.35), keep=Keep.TOP)

    split(bisect_by=Plane(origin=(-0.1188491357, 0, 1.205545035), x_dir=(0, 1, 0), z_dir=(0.0981097812, 0, -0.995175598)), keep=Keep.TOP)


with BuildPart() as f15_tool37_1:
    add(f15_tool37.part)

    # F15_t47: intersect F15_tool42
    add(f15_tool42.part, mode=Mode.INTERSECT)


with BuildPart() as f1_11:
    add(f1_10.part)

    # F15_t35: cut F15_tool37
    add(f15_tool37_1.part, mode=Mode.SUBTRACT)


with BuildPart() as f15_tool50:
    # F15_s51 → F15_t52 (new body)
    with BuildSketch(Plane(origin=(35.0278234042, 0, 45.4258375046), x_dir=(0, 1, 0), z_dir=(-0.6106398818, 0, -0.7919084131))):
        with BuildLine():
            Line((-4.1853949204, 2.2400344876), (-12.9342050796, 10.9888446469))
            Line((-12.9342050796, 10.9888446469), (-13.0998130796, 10.9888446469))
            ThreePointArc((-13.0998130796, 10.9888446469), (-12.865608, 6.7315421071), (-12.865608, 2.4742395673))
            Line((-12.865608, 2.4742395673), (-12.7, 2.3086315673))
            ThreePointArc((-12.7, 2.3086315673), (-8.4426974602, 2.3086315673), (-4.1853949204, 2.0744264876))
            Line((-4.1853949204, 2.0744264876), (-4.1853949204, 2.2400344876))
        make_face()
    extrude(amount=F15_T52_DEPTH)

    split(bisect_by=Plane.XZ.offset(6.35), keep=Keep.TOP)

    split(bisect_by=Plane(origin=(29.8410766305, 0, 16.3828511415), x_dir=(0, 1, 0), z_dir=(0.8765845615, 0, 0.4812478639)), keep=Keep.TOP)


with BuildPart() as f15_tool55:
    # F15_s56 → F15_t57 (new body)
    with BuildSketch(Plane(origin=(16.6142460012, 0, -30.2625583178), x_dir=(0, 1, 0), z_dir=(-0.4812478639, 0, 0.8765845615))):
        with BuildLine():
            Line((-4.1853949204, -34.2766442695), (-12.9342050796, -25.5278341102))
            Line((-12.9342050796, -25.5278341102), (-13.0998130796, -25.5278341102))
            ThreePointArc((-13.0998130796, -25.5278341102), (-12.865608, -29.78513665), (-12.865608, -34.0424391898))
            Line((-12.865608, -34.0424391898), (-12.7, -34.2080471898))
            ThreePointArc((-12.7, -34.2080471898), (-8.4426974602, -34.2080471898), (-4.1853949204, -34.4422522695))
            Line((-4.1853949204, -34.4422522695), (-4.1853949204, -34.2766442695))
        make_face()
    extrude(amount=F15_T57_DEPTH)

    split(bisect_by=Plane.XZ.offset(6.35), keep=Keep.TOP)

    split(bisect_by=Plane(origin=(1.9593711293, 0, -1.510869357), x_dir=(0, 1, 0), z_dir=(-0.7919084131, 0, 0.6106398818)), keep=Keep.TOP)


with BuildPart() as f15_tool50_1:
    add(f15_tool50.part)

    # F15_t60: intersect F15_tool55
    add(f15_tool55.part, mode=Mode.INTERSECT)


with BuildPart() as f1_12:
    add(f1_11.part)

    # F15_t48: cut F15_tool50
    add(f15_tool50_1.part, mode=Mode.SUBTRACT)

    # F16: chamfer of 8.255 on 3 edges, made by hand


with BuildPart() as f16_tool2:
    # F16_s3 → F16_t4 (new body)
    with BuildSketch(Plane(origin=(22.9558477812, 0, -53.1834395633), x_dir=(0, 1, 0), z_dir=(-0.3962944615, 0, 0.9181234665))):
        Polygon((-4.445, 2.118579565), (-12.7, 10.373579565), (-12.7, 2.118579565), align=None)
    extrude(amount=F16_T4_DEPTH)

    split(bisect_by=Plane.XZ.offset(6.35), keep=Keep.TOP)

    split(bisect_by=Plane.XY.offset(-34.5319546759), keep=Keep.TOP)


with BuildPart() as f1_13:
    add(f1_12.part)

    # F16_t1: cut F16_tool2
    add(f16_tool2.part, mode=Mode.SUBTRACT)


with BuildPart() as f16_tool8:
    # F16_s9 → F16_t10 (new body)
    with BuildSketch(Plane(origin=(6.4040370991, 0, 15.0028308588), x_dir=(0, 1, 0), z_dir=(-0.3925854105, 0, -0.9197155514))):
        Polygon((-4.445, 2.0987510779), (-12.7, 10.3537510779), (-12.7, 2.0987510779), align=None)
    extrude(amount=F16_T10_DEPTH)

    split(bisect_by=Plane.XZ.offset(6.35), keep=Keep.TOP)

    split(bisect_by=Plane.XY.offset(-34.5319546759), keep=Keep.TOP)


with BuildPart() as f1_14:
    add(f1_13.part)

    # F16_t7: cut F16_tool8
    add(f16_tool8.part, mode=Mode.SUBTRACT)


with BuildPart() as f16_tool14:
    # F16_s15 → F16_t16 (new body)
    with BuildSketch(Plane.YZ.offset(-33.6874324563)):
        Polygon((-4.445, -34.5319546759), (-12.7, -26.2769546759), (-12.7, -34.5319546759), align=None)
    extrude(amount=F16_T16_DEPTH)

    split(bisect_by=Plane.XZ.offset(6.35), keep=Keep.TOP)

    split(bisect_by=Plane(origin=(-1.9451176143, 0, -0.8395813478), x_dir=(0, 1, 0), z_dir=(-0.9181234665, 0, -0.3962944615)), keep=Keep.TOP)

    split(bisect_by=Plane(origin=(1.9302540048, 0, -0.8239390535), x_dir=(0, 1, 0), z_dir=(0.9197155514, 0, -0.3925854105)), keep=Keep.TOP)


with BuildPart() as f1_15:
    add(f1_14.part)

    # F16_t13: cut F16_tool14
    add(f16_tool14.part, mode=Mode.SUBTRACT)

    # F17 (on face) → F18 (join)
    with BuildSketch(Plane(origin=(0, 6.35, 0), x_dir=(-1, 0, 0), z_dir=(0, 1, 0))):
        Polygon((0.1139463857, -15.4419038445), (-13.0555815995, 7.0367623121), (-26.1111631989, -15.4419038445), align=None)
        Polygon((0.1139463857, -15.4419038445), (13.1695279852, 7.0367623121), (-13.0555815995, 7.0367623121), align=None)
        Polygon((13.1695279852, 7.0367623121), (0, 29.5154284686), (-13.0555815995, 7.0367623121), align=None)
        Polygon((26.3390559703, -15.4419038445), (13.1695279852, 7.0367623121), (0.1139463857, -15.4419038445), align=None)
    extrude(amount=F18_DEPTH)

    # F19 (on face) → F20 (cut)
    with BuildSketch(Plane(origin=(0, 12.7, 0), x_dir=(-1, 0, 0), z_dir=(0, 1, 0))):
        Polygon((12.9840383306, 6.3451784663), (-12.7162076533, 6.3451784663), (0, -15.0037035346), align=None)
    extrude(amount=-F20_DEPTH, mode=Mode.SUBTRACT)


solid = f1_15.part
